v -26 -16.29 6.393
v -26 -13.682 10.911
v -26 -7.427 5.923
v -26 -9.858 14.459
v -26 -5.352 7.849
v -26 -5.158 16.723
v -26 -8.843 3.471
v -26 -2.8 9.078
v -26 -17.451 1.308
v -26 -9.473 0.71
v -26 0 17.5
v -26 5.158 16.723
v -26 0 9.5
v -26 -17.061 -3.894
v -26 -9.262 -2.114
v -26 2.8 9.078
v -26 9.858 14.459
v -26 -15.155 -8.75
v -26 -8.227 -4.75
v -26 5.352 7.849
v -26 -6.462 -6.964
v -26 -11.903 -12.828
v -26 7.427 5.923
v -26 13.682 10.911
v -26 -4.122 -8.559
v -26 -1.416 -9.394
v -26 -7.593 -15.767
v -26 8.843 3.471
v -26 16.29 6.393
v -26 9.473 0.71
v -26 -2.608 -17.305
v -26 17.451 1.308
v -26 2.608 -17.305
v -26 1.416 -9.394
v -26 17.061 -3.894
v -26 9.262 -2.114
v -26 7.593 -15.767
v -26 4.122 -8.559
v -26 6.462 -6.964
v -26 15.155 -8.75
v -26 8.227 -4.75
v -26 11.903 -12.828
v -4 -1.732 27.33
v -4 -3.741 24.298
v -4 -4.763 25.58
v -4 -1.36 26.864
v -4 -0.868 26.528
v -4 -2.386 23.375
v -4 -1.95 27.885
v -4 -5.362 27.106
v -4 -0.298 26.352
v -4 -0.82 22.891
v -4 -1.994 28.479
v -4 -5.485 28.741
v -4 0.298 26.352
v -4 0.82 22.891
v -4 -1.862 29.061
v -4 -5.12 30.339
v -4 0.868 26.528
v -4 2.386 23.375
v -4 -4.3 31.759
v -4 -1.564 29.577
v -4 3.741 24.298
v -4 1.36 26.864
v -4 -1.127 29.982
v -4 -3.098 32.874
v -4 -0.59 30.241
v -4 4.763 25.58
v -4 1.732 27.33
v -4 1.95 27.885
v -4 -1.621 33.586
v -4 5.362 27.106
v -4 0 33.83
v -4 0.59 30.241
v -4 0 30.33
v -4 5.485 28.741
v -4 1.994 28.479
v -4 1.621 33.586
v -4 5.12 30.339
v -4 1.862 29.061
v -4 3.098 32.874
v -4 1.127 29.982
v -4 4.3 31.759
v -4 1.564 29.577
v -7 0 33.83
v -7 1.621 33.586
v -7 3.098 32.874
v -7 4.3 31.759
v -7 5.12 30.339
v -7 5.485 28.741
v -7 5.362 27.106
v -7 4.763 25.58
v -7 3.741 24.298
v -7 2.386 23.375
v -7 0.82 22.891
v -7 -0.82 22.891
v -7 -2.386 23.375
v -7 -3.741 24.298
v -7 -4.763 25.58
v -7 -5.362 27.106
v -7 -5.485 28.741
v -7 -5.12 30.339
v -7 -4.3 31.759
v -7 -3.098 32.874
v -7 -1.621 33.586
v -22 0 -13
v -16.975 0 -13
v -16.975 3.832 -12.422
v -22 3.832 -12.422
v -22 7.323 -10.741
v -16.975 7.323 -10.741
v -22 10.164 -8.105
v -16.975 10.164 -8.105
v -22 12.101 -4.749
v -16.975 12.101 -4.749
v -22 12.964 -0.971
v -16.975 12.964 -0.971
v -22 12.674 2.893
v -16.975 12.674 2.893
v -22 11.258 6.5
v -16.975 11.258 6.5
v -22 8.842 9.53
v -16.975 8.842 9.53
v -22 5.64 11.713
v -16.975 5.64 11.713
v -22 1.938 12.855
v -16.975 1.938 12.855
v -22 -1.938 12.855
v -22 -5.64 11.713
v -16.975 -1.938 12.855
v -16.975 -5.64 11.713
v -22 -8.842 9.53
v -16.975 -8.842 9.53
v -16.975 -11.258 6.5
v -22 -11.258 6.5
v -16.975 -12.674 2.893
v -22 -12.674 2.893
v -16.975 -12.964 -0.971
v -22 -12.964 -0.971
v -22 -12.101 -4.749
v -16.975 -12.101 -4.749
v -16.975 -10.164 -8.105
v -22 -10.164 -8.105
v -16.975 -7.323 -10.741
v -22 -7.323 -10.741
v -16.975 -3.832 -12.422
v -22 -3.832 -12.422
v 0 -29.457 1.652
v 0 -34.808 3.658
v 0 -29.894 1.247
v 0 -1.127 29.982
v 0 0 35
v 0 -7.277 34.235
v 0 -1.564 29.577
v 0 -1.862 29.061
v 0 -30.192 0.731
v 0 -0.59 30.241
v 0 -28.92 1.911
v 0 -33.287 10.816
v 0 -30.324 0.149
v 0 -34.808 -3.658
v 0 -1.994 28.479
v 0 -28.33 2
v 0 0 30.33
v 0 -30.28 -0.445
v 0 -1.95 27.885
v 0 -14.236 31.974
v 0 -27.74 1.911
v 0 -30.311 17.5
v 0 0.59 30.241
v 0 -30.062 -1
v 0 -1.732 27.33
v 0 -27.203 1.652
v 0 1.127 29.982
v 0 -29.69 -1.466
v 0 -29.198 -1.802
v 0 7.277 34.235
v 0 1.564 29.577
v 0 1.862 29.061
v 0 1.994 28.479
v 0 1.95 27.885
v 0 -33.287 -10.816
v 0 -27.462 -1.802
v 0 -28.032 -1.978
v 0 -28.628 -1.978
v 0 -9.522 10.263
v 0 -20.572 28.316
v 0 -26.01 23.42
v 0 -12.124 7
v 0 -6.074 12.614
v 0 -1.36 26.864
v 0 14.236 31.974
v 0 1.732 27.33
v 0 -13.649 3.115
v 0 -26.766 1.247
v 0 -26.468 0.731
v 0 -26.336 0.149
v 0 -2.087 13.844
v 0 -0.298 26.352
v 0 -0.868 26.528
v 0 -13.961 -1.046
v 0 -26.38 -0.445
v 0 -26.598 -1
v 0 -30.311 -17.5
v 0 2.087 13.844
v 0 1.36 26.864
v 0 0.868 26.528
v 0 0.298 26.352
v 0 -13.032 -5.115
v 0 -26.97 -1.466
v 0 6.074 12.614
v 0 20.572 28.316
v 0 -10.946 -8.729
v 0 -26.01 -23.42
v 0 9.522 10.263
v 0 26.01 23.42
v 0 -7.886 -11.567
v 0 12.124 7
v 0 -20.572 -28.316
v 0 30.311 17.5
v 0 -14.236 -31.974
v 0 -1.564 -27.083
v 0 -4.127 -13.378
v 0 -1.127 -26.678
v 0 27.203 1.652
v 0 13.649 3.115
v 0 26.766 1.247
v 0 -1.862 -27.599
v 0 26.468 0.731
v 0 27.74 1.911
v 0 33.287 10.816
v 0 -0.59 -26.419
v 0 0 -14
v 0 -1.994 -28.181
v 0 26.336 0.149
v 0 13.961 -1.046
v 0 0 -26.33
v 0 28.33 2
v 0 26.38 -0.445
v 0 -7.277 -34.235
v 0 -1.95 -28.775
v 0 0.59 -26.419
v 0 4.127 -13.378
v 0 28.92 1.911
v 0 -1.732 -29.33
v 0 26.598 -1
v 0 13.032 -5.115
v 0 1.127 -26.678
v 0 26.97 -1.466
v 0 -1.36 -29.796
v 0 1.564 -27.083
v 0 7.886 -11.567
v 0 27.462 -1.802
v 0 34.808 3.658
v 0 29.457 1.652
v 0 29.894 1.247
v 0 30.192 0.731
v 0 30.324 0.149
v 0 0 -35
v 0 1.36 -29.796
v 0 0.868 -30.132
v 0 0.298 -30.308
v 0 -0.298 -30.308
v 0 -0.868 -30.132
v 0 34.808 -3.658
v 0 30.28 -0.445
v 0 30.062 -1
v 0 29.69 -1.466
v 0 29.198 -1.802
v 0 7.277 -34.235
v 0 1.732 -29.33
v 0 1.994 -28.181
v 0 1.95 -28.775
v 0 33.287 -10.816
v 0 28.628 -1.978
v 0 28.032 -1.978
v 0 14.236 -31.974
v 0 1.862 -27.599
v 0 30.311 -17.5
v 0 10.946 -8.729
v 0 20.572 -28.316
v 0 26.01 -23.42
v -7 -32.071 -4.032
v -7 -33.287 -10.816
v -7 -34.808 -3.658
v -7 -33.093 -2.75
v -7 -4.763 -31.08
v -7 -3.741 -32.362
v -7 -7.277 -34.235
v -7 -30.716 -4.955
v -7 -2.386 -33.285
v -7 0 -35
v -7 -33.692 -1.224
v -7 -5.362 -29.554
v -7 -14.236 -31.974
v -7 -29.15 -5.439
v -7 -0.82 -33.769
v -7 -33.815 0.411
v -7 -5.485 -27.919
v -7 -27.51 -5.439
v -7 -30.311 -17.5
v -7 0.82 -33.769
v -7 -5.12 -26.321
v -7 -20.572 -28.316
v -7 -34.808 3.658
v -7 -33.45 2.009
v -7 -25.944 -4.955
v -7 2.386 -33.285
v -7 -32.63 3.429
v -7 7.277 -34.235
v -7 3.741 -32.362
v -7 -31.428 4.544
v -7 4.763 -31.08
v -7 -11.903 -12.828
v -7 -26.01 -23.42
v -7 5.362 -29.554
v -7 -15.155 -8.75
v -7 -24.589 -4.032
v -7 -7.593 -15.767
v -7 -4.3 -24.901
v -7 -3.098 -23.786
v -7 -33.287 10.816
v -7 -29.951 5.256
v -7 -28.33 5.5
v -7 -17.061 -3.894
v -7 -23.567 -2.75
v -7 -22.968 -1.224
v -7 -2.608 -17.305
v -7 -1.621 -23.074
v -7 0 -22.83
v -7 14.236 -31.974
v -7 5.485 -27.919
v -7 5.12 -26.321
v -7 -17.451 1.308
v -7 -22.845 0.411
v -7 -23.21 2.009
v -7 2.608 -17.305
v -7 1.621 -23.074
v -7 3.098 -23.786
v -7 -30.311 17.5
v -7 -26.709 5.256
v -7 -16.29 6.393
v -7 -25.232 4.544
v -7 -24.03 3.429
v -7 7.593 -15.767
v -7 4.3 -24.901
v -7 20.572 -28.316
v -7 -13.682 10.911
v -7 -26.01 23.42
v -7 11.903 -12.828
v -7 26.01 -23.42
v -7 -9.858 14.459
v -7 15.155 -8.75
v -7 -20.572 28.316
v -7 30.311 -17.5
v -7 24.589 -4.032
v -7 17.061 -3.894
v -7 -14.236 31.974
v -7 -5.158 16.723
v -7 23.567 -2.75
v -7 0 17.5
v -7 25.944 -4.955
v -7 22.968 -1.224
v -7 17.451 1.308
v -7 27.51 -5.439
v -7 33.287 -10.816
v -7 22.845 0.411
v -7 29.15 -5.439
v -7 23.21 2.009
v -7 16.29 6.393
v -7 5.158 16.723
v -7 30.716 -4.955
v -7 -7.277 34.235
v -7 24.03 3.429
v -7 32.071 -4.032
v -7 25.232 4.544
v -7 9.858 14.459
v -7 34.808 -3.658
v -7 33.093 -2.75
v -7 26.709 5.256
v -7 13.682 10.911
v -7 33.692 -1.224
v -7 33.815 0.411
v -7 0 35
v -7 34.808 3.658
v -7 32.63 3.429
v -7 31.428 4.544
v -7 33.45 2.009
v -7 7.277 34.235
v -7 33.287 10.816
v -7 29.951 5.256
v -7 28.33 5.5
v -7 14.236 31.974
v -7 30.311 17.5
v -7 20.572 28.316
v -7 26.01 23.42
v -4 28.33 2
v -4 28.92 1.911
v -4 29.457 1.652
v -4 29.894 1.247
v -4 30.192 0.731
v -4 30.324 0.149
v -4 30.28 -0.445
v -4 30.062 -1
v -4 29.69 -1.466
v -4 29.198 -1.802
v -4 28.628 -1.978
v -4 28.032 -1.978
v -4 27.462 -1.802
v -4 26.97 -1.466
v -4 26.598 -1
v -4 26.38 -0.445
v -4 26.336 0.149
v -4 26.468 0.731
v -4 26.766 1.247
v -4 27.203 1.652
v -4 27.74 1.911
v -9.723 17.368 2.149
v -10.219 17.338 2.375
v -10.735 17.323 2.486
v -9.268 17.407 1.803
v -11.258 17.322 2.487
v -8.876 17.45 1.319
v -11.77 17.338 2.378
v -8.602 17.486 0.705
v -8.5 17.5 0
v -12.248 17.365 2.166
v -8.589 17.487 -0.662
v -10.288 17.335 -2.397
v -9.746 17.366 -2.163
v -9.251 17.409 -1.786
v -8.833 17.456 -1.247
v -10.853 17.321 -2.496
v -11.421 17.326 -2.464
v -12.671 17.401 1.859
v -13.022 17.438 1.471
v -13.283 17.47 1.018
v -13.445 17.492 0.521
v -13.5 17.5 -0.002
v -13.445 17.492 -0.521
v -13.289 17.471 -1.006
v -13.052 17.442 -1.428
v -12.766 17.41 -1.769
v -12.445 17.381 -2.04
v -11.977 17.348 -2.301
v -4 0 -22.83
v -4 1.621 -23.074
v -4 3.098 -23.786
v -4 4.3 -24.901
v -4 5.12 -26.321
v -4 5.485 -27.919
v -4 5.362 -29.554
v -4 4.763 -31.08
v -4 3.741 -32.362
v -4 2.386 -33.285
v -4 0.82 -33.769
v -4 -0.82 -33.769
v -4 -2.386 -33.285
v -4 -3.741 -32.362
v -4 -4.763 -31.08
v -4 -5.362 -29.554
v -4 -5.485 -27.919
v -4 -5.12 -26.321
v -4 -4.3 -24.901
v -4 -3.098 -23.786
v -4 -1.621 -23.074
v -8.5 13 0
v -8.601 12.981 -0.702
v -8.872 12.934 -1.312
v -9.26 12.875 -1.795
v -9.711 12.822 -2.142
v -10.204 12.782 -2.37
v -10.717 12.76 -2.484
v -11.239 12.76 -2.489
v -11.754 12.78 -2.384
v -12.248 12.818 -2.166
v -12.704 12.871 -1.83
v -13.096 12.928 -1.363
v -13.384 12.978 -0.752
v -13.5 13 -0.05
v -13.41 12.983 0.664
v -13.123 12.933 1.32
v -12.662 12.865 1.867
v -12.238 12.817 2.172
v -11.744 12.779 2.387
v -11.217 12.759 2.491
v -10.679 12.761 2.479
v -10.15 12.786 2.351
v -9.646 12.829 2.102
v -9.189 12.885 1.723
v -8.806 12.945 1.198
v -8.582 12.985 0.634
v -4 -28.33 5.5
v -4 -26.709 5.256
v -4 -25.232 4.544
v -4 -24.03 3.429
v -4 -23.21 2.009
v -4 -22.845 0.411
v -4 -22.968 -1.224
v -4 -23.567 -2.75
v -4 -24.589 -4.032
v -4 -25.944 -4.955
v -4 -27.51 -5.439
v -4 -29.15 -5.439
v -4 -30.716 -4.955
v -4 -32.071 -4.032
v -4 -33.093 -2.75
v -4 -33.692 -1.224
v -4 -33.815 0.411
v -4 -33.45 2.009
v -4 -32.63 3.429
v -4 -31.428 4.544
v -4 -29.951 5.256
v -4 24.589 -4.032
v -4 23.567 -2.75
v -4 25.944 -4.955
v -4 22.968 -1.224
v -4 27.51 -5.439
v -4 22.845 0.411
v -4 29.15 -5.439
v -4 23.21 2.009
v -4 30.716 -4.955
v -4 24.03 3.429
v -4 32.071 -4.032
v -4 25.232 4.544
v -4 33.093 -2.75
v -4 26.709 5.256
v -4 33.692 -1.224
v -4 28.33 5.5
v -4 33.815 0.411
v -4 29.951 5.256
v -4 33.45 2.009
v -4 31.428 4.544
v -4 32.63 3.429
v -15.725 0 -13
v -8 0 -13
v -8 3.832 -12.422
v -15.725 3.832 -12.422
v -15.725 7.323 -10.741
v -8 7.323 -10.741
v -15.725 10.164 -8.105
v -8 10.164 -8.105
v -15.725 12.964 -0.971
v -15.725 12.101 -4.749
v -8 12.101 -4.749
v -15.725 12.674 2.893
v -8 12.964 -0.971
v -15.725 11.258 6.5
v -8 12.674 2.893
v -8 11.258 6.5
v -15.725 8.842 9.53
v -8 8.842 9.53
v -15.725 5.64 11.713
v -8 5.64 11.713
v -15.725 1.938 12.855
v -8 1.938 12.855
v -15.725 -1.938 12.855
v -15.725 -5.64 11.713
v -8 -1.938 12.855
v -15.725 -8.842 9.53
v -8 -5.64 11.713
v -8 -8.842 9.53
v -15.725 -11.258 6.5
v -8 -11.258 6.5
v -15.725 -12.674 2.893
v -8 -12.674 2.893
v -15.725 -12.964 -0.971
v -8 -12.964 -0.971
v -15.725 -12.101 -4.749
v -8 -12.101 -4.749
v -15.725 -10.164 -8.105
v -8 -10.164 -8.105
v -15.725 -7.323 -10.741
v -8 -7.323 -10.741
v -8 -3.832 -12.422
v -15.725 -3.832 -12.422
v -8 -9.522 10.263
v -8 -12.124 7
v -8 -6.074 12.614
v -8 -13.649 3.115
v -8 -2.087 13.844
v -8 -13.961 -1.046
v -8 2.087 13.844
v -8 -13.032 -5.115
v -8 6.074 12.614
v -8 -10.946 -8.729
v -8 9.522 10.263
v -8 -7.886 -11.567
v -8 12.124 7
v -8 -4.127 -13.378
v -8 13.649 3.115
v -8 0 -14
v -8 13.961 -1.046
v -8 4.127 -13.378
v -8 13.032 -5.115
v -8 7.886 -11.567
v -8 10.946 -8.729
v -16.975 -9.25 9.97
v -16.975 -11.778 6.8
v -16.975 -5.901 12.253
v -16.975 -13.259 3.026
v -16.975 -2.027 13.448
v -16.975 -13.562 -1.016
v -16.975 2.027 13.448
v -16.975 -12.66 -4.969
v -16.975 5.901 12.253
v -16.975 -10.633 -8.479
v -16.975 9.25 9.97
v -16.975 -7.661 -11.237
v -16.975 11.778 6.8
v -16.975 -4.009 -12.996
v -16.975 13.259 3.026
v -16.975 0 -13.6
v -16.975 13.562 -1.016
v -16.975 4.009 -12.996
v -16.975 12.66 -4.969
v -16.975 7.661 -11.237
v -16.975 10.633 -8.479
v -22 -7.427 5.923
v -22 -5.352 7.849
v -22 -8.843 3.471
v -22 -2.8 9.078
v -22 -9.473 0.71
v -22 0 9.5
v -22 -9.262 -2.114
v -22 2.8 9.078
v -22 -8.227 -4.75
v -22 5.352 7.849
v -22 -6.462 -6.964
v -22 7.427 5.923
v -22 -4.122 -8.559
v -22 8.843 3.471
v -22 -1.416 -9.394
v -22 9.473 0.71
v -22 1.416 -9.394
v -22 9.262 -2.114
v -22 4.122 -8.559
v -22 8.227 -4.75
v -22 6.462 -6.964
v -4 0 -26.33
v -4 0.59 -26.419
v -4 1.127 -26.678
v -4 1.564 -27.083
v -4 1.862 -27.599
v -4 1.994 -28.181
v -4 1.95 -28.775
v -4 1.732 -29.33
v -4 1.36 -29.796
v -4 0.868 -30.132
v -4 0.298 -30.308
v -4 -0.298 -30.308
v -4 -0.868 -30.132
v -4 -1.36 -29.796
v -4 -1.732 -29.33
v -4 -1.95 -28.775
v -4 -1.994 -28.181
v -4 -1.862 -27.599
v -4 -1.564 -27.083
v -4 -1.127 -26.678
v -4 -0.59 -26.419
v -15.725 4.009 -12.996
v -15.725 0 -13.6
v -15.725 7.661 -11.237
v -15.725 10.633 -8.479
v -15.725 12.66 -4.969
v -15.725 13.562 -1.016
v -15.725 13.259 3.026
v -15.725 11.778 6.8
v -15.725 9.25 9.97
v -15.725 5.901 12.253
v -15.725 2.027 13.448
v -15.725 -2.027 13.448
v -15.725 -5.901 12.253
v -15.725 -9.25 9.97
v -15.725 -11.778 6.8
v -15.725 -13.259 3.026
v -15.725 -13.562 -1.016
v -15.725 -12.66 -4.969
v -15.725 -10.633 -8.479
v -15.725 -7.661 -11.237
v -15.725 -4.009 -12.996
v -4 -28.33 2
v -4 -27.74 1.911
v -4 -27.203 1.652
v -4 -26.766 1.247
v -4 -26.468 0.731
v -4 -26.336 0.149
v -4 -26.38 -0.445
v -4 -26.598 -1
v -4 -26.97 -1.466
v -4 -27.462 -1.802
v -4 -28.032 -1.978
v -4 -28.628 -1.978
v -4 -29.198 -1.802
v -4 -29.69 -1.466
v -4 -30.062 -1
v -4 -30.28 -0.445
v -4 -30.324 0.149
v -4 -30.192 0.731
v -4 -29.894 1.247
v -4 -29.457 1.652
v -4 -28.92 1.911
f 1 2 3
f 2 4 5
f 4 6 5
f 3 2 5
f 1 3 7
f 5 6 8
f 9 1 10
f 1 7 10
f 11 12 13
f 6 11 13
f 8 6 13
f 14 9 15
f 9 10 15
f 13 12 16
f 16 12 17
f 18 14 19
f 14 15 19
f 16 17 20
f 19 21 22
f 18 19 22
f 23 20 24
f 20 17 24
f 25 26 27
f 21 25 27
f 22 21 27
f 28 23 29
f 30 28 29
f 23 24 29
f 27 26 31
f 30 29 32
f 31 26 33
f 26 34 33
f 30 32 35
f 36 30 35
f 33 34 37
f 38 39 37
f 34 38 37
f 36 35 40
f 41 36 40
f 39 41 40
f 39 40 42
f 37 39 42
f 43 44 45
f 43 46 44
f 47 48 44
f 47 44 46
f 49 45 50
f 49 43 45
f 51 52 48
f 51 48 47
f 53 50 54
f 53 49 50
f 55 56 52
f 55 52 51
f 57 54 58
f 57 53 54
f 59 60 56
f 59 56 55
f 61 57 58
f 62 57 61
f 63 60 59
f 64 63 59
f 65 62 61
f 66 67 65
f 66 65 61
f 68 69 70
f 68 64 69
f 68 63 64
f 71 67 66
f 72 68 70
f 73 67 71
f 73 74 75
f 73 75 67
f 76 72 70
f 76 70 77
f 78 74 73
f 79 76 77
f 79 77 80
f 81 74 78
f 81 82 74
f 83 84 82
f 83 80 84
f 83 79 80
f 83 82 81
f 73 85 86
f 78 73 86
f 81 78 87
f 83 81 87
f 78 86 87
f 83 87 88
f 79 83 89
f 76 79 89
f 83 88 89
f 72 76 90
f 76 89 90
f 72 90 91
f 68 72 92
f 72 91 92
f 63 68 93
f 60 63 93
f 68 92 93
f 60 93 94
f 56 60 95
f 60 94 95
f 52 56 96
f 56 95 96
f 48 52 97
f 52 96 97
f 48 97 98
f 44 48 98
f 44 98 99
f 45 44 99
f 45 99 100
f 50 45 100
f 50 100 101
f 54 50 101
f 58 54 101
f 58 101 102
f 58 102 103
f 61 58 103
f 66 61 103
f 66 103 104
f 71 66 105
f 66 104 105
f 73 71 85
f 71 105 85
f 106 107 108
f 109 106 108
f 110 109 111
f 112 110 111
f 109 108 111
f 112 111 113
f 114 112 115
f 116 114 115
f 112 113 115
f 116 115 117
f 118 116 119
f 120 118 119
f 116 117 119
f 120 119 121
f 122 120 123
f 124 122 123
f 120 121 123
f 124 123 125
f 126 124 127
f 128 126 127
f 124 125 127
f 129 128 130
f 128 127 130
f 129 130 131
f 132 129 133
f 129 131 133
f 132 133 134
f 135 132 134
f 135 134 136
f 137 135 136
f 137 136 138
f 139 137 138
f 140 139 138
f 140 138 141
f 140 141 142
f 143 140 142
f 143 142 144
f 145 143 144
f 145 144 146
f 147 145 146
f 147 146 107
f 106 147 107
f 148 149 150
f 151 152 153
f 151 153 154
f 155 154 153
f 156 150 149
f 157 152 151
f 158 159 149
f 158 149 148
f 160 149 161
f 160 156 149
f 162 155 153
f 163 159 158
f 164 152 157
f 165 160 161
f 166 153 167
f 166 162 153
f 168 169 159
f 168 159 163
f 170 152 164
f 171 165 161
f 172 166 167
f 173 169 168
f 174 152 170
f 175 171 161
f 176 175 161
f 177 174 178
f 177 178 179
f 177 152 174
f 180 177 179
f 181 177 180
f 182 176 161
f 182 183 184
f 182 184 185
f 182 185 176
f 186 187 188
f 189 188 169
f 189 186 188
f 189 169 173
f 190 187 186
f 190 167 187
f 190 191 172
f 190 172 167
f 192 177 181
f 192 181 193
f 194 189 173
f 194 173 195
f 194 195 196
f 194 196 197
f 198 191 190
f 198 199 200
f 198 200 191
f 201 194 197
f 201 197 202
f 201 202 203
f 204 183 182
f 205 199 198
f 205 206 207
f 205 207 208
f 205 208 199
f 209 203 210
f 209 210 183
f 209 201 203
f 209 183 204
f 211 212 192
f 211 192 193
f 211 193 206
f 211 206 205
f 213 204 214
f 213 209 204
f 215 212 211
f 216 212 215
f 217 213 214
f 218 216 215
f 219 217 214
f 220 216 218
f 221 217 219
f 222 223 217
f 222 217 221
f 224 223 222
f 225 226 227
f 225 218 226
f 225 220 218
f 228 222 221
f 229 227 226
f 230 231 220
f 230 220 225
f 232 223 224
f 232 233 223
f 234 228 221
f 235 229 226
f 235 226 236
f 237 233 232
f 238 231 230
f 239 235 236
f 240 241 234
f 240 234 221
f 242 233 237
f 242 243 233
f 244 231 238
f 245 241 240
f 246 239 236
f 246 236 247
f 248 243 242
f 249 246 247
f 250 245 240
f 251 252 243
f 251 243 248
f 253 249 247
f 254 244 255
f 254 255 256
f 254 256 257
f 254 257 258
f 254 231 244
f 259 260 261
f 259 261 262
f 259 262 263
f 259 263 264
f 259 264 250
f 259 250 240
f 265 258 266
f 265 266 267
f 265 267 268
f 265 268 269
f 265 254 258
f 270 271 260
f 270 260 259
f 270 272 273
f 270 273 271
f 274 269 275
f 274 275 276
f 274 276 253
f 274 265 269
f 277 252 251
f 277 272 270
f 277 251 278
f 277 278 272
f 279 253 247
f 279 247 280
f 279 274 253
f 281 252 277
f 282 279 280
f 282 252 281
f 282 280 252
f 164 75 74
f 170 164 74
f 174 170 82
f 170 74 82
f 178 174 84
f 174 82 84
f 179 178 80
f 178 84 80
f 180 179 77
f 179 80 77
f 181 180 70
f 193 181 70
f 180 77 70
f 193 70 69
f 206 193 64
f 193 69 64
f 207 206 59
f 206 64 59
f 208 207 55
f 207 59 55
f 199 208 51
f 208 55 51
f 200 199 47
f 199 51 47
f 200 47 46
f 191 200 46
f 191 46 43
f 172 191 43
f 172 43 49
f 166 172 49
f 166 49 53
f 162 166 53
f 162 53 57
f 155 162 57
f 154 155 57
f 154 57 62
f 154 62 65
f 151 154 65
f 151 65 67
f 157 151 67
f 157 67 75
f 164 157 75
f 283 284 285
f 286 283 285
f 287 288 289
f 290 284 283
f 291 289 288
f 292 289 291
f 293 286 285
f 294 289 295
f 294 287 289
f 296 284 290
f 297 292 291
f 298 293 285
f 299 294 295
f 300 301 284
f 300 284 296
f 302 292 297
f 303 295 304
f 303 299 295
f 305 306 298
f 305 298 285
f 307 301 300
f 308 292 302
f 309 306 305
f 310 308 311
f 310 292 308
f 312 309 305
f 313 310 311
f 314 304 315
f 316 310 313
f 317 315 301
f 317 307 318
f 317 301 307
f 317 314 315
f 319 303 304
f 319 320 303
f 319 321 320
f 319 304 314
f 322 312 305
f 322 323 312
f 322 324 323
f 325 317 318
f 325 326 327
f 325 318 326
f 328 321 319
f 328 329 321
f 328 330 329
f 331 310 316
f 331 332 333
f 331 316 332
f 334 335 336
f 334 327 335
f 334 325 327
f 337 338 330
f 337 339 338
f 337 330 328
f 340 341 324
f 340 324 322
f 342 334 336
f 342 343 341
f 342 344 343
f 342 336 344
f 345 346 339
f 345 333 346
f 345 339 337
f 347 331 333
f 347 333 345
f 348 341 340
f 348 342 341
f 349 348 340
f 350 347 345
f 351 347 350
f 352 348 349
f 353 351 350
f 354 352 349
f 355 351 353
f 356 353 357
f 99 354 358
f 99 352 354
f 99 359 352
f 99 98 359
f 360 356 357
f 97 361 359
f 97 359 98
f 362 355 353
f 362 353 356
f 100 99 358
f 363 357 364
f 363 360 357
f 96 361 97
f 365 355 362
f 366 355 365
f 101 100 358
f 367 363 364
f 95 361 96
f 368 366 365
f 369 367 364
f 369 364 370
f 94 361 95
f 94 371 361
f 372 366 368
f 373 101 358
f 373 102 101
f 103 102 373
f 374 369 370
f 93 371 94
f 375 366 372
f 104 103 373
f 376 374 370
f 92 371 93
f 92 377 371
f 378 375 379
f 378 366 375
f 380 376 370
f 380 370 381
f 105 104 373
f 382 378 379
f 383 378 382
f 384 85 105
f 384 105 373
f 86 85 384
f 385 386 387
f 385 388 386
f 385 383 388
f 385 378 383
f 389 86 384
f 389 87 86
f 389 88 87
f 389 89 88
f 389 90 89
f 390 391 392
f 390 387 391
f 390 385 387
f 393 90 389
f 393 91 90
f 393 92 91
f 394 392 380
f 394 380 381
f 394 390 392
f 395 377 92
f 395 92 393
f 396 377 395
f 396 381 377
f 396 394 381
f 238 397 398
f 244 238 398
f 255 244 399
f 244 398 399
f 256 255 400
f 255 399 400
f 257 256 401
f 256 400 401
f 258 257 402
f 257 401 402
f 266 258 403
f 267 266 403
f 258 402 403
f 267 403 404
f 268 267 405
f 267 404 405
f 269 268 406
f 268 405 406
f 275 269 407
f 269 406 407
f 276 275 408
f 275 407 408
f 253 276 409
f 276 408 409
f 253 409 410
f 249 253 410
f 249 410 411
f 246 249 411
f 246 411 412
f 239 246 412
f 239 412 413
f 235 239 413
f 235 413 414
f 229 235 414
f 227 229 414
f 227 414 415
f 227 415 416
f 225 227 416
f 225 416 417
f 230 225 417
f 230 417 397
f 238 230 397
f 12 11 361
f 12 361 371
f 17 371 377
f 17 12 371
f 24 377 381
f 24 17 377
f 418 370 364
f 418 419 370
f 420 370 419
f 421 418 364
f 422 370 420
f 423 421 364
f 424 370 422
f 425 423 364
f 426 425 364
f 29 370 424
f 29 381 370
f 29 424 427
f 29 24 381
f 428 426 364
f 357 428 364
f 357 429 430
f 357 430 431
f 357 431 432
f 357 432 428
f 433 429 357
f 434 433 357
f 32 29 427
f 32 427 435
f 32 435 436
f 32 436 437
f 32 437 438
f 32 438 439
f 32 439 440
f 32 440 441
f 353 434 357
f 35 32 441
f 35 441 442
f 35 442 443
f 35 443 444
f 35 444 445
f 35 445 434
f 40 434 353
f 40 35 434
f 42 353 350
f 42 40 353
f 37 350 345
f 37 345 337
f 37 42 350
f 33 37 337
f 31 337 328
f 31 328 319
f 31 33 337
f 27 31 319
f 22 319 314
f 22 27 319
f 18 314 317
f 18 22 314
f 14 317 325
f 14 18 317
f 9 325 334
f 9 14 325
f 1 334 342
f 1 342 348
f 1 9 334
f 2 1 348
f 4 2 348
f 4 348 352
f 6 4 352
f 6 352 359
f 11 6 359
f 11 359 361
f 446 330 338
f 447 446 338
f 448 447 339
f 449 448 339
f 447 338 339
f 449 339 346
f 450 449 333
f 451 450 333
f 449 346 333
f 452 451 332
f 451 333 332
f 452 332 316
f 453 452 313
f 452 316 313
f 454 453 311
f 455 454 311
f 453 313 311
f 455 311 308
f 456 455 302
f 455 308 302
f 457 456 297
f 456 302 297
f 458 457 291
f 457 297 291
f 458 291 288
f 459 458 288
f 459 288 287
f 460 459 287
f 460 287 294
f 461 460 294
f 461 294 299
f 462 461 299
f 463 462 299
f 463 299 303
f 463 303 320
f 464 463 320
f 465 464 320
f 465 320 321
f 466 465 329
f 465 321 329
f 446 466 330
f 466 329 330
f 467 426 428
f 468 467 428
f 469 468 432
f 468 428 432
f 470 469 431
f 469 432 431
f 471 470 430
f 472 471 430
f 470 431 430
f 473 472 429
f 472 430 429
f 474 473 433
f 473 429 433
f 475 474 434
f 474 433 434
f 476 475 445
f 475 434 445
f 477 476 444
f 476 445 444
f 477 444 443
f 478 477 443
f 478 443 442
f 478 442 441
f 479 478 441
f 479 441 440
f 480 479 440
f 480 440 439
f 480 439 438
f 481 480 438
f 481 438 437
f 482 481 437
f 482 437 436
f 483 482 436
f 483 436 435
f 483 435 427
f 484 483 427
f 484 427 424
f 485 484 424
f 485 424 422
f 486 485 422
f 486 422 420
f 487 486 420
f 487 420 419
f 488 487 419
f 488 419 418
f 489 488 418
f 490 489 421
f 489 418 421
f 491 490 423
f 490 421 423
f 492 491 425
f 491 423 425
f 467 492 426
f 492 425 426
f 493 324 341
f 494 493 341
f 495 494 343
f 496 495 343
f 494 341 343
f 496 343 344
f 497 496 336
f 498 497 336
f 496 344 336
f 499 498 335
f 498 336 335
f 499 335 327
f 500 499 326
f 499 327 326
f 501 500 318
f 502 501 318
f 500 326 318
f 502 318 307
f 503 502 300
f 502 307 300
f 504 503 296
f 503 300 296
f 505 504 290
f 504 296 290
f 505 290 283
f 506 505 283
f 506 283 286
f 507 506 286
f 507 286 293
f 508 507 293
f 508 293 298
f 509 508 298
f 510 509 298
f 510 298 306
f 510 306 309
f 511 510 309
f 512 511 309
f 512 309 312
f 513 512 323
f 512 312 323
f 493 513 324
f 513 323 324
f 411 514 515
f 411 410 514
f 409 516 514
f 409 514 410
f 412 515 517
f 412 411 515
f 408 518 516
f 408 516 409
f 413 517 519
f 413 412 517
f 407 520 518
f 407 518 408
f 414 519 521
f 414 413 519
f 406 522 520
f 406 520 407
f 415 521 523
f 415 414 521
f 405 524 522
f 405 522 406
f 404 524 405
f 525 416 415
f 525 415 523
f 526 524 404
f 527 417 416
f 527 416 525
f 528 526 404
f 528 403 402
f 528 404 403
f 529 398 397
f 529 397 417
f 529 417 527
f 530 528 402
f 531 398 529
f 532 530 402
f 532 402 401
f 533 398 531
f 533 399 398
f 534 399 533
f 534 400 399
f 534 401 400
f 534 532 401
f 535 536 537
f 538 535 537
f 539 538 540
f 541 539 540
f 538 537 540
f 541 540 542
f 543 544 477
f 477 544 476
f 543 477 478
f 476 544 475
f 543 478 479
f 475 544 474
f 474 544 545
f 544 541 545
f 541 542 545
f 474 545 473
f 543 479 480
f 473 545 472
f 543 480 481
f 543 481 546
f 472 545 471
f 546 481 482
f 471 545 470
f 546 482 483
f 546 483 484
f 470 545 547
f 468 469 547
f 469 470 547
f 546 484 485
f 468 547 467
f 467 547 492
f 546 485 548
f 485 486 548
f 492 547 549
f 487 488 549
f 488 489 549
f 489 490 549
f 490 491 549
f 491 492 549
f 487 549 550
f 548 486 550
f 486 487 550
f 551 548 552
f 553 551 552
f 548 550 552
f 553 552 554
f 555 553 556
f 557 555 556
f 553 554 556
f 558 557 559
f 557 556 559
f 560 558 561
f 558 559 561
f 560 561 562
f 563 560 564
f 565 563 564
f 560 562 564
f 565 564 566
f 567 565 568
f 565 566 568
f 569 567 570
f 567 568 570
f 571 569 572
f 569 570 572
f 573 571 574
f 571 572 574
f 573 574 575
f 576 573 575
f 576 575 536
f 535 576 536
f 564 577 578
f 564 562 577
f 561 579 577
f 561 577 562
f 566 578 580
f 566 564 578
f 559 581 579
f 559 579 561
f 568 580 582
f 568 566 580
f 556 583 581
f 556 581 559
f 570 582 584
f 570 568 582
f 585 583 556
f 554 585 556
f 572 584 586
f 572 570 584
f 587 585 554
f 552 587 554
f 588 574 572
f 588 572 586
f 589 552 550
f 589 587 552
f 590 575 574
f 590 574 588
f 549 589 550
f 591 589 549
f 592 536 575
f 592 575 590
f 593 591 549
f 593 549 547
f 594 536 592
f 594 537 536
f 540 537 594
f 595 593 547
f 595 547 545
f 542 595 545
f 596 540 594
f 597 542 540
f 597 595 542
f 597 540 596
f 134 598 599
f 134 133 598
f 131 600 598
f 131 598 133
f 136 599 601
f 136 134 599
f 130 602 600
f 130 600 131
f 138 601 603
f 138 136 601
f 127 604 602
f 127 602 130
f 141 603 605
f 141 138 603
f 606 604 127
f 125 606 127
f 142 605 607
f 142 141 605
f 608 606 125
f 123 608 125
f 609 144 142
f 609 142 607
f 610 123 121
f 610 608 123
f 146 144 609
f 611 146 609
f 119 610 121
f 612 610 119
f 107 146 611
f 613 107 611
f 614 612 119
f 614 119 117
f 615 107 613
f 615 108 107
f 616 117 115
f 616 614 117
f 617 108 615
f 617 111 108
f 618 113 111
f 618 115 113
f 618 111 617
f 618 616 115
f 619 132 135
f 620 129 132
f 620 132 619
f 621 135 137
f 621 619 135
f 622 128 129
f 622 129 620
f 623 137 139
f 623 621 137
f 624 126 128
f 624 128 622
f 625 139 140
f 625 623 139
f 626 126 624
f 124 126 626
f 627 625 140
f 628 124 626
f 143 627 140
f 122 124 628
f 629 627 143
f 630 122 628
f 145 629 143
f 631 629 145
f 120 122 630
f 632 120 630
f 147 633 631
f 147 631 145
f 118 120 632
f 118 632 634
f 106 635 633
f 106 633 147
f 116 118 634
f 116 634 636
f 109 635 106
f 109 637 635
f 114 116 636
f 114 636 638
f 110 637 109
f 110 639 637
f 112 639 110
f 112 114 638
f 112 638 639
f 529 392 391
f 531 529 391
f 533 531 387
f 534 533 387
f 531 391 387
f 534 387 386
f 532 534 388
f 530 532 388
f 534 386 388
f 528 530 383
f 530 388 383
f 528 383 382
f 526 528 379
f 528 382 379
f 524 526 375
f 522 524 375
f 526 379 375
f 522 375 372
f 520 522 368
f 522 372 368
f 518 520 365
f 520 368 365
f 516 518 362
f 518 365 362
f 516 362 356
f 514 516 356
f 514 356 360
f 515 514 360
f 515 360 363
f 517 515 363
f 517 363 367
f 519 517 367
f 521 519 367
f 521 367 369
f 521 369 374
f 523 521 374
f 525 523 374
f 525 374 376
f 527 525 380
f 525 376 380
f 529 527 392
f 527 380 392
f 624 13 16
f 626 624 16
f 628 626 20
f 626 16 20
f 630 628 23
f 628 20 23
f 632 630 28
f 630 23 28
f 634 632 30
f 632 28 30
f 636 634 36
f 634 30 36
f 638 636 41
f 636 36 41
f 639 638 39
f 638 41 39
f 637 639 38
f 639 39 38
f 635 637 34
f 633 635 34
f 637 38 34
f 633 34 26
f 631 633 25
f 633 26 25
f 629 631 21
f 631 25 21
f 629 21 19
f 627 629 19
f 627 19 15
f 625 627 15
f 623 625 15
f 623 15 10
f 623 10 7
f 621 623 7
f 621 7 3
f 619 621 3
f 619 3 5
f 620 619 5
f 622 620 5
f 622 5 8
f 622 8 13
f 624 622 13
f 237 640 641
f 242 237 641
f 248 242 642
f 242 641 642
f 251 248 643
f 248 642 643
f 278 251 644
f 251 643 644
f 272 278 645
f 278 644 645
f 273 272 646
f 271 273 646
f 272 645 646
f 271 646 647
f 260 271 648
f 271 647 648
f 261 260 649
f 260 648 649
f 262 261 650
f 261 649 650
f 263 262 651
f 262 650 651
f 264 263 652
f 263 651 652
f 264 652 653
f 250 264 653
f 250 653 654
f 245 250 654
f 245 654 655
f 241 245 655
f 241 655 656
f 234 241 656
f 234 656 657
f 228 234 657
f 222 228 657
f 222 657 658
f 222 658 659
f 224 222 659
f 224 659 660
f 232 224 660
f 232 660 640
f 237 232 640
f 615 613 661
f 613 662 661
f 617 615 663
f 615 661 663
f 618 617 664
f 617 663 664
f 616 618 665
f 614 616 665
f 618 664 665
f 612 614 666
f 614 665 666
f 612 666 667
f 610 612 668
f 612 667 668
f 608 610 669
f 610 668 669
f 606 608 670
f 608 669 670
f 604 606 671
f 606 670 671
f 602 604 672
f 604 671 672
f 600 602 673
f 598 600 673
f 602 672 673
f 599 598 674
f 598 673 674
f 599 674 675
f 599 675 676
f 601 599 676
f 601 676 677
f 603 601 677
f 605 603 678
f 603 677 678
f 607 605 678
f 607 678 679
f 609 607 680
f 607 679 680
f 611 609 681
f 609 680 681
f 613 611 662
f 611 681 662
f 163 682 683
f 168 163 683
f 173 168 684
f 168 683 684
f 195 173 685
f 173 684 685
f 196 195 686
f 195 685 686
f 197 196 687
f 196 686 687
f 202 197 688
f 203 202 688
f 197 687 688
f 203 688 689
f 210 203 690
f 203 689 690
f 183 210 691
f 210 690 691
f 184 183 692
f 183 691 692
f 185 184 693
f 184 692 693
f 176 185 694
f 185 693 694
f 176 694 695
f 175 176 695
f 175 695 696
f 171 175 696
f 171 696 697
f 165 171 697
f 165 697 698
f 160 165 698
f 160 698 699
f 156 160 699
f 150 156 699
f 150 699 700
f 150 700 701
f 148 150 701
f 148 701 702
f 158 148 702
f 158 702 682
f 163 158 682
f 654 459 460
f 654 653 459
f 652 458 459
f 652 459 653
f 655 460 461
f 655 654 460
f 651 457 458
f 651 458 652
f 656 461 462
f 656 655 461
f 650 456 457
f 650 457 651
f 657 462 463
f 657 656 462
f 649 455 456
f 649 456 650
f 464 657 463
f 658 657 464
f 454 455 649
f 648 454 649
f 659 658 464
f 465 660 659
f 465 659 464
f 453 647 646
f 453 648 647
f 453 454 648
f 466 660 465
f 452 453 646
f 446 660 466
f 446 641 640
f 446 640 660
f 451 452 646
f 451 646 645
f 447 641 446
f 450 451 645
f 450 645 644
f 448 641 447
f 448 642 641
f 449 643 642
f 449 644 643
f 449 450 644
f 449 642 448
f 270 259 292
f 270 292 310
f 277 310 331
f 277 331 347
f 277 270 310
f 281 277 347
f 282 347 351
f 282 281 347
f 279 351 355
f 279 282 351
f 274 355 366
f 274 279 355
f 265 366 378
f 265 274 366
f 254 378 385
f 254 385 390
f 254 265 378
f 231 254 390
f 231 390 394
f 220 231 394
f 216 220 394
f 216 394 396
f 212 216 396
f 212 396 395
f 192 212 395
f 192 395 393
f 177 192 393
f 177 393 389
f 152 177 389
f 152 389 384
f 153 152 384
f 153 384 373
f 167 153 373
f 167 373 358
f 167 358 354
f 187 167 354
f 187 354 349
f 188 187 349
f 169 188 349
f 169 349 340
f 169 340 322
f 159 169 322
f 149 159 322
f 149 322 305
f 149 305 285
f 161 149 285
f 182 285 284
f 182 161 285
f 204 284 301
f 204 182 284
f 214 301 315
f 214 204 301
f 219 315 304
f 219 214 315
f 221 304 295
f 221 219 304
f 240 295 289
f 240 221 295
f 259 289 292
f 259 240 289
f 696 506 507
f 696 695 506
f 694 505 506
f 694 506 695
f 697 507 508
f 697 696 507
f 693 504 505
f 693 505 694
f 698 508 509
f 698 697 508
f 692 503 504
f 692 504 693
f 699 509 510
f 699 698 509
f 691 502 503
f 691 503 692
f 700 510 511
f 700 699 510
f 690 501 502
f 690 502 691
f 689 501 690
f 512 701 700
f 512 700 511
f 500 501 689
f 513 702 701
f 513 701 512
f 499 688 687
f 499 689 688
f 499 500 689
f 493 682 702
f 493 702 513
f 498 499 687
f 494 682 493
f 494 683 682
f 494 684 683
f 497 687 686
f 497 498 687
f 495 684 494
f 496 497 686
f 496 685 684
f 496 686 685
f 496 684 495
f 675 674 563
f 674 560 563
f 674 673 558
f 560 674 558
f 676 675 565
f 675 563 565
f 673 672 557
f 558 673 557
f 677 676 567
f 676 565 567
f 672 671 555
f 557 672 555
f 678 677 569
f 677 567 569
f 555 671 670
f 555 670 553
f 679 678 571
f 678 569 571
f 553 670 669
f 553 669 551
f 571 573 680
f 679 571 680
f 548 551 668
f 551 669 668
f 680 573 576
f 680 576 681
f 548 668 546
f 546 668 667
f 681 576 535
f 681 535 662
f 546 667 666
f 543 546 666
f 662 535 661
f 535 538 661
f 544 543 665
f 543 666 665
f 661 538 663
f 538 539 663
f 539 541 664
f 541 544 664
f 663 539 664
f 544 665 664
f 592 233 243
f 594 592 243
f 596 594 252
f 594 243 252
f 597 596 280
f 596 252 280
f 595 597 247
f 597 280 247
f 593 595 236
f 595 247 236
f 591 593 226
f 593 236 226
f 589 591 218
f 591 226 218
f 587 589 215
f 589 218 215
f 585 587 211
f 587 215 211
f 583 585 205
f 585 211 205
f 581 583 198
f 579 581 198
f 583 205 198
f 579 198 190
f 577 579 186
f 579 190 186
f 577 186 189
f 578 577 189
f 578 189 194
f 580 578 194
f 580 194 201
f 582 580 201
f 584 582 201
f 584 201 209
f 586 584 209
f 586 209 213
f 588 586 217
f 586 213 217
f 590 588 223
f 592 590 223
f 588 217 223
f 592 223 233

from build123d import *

# Parameters (mm, degrees)
SKETCH1_R           = 35
BOSS_EXTRUDE1_DEPTH = 26
SKETCH2_R           = 35
SKETCH2_R_2         = 17.5
CUT_EXTRUDE1_DEPTH  = 19
SKETCH3_R           = 2
CUT_EXTRUDE2_DEPTH  = 18
SKETCH4_R           = 5.5
CUT_EXTRUDE4_DEPTH  = 3
CUT_EXTRUDE5_REACH  = 28
SKETCH5_R           = 9.5
SKETCH6_R           = 13
CUT_EXTRUDE6_DEPTH  = 22
CUT_EXTRUDE7_REACH  = 54.5
SKETCH7_R           = 2.5
SKETCH8_R           = 14
CUT_EXTRUDE8_DEPTH  = 8
SKETCH9_R           = 13.6
CUT_EXTRUDE9_DEPTH  = 0.625


with BuildPart() as part:
    # Sketch1 → Boss-Extrude1 (new body)
    with BuildSketch(Plane(origin=(0, 0, 0), x_dir=(0, 0, -1), z_dir=(1, 0, 0))):
        Circle(SKETCH1_R)
    extrude(amount=-BOSS_EXTRUDE1_DEPTH)

    # Sketch2 → Cut-Extrude1 (cut)
    with BuildSketch(Plane.ZY.offset(26)):
        Circle(SKETCH2_R)
        Circle(SKETCH2_R_2, mode=Mode.SUBTRACT)
    extrude(amount=-CUT_EXTRUDE1_DEPTH, mode=Mode.SUBTRACT)

    # Sketch3 → Cut-Extrude2 (cut)
    with BuildSketch(Plane.ZY.offset(7)):
        with Locations((0, 28.33)):
            Circle(SKETCH3_R)
        with Locations((28.33, 0)):
            Circle(SKETCH3_R)
        with Locations((0, -28.33)):
            Circle(SKETCH3_R)
        with Locations((-28.33, 0)):
            Circle(SKETCH3_R)
    extrude(amount=-CUT_EXTRUDE2_DEPTH, mode=Mode.SUBTRACT)

    # Sketch4 → Cut-Extrude4 (cut)
    with BuildSketch(Plane.ZY.offset(7)):
        with Locations((0, 28.33)):
            Circle(SKETCH4_R)
        with Locations((28.33, 0)):
            Circle(SKETCH4_R)
        with Locations((0, -28.33)):
            Circle(SKETCH4_R)
        with Locations((-28.33, 0)):
            Circle(SKETCH4_R)
    extrude(amount=-CUT_EXTRUDE4_DEPTH, mode=Mode.SUBTRACT)

    # Sketch5 → Cut-Extrude5 (cut, up to next)
    with BuildSketch(Plane.ZY.offset(26), mode=Mode.PRIVATE) as cut_extrude5_sk1:
        Circle(SKETCH5_R)
    cut_extrude5_tool1 = extrude(cut_extrude5_sk1.sketch, amount=-CUT_EXTRUDE5_REACH, mode=Mode.PRIVATE) & part.part
    add(cut_extrude5_tool1.solids().sort_by_distance((-26, 0, 0))[0], mode=Mode.SUBTRACT)

    # Sketch6 → Cut-Extrude6 (cut)
    with BuildSketch(Plane(origin=(0, 0, 0), x_dir=(0, 0, -1), z_dir=(1, 0, 0))):
        Circle(SKETCH6_R)
    extrude(amount=-CUT_EXTRUDE6_DEPTH, mode=Mode.SUBTRACT)

    # Sketch7 → Cut-Extrude7 (cut, up to next)
    with BuildSketch(Plane(origin=(0, 17.5, 0), x_dir=(1, 0, 0), z_dir=(0, 1, 0)), mode=Mode.PRIVATE) as cut_extrude7_sk1:
        with Locations((-11, 0)):
            Circle(SKETCH7_R)
    cut_extrude7_tool1 = extrude(cut_extrude7_sk1.sketch, amount=-CUT_EXTRUDE7_REACH, mode=Mode.PRIVATE) & part.part
    add(cut_extrude7_tool1.solids().sort_by_distance((-11, 17.5, 0))[0], mode=Mode.SUBTRACT)

    # Sketch8 → Cut-Extrude8 (cut)
    with BuildSketch(Plane(origin=(0, 0, 0), x_dir=(0, 0, -1), z_dir=(1, 0, 0))):
        Circle(SKETCH8_R)
    extrude(amount=-CUT_EXTRUDE8_DEPTH, mode=Mode.SUBTRACT)

    # Sketch9 → Cut-Extrude9 (cut, symmetric)
    with BuildSketch(Plane(origin=(-16.35, 0, 0), x_dir=(0, 0, -1), z_dir=(1, 0, 0))):
        Circle(SKETCH9_R)
    extrude(amount=CUT_EXTRUDE9_DEPTH, both=True, mode=Mode.SUBTRACT)


solid = part.part
